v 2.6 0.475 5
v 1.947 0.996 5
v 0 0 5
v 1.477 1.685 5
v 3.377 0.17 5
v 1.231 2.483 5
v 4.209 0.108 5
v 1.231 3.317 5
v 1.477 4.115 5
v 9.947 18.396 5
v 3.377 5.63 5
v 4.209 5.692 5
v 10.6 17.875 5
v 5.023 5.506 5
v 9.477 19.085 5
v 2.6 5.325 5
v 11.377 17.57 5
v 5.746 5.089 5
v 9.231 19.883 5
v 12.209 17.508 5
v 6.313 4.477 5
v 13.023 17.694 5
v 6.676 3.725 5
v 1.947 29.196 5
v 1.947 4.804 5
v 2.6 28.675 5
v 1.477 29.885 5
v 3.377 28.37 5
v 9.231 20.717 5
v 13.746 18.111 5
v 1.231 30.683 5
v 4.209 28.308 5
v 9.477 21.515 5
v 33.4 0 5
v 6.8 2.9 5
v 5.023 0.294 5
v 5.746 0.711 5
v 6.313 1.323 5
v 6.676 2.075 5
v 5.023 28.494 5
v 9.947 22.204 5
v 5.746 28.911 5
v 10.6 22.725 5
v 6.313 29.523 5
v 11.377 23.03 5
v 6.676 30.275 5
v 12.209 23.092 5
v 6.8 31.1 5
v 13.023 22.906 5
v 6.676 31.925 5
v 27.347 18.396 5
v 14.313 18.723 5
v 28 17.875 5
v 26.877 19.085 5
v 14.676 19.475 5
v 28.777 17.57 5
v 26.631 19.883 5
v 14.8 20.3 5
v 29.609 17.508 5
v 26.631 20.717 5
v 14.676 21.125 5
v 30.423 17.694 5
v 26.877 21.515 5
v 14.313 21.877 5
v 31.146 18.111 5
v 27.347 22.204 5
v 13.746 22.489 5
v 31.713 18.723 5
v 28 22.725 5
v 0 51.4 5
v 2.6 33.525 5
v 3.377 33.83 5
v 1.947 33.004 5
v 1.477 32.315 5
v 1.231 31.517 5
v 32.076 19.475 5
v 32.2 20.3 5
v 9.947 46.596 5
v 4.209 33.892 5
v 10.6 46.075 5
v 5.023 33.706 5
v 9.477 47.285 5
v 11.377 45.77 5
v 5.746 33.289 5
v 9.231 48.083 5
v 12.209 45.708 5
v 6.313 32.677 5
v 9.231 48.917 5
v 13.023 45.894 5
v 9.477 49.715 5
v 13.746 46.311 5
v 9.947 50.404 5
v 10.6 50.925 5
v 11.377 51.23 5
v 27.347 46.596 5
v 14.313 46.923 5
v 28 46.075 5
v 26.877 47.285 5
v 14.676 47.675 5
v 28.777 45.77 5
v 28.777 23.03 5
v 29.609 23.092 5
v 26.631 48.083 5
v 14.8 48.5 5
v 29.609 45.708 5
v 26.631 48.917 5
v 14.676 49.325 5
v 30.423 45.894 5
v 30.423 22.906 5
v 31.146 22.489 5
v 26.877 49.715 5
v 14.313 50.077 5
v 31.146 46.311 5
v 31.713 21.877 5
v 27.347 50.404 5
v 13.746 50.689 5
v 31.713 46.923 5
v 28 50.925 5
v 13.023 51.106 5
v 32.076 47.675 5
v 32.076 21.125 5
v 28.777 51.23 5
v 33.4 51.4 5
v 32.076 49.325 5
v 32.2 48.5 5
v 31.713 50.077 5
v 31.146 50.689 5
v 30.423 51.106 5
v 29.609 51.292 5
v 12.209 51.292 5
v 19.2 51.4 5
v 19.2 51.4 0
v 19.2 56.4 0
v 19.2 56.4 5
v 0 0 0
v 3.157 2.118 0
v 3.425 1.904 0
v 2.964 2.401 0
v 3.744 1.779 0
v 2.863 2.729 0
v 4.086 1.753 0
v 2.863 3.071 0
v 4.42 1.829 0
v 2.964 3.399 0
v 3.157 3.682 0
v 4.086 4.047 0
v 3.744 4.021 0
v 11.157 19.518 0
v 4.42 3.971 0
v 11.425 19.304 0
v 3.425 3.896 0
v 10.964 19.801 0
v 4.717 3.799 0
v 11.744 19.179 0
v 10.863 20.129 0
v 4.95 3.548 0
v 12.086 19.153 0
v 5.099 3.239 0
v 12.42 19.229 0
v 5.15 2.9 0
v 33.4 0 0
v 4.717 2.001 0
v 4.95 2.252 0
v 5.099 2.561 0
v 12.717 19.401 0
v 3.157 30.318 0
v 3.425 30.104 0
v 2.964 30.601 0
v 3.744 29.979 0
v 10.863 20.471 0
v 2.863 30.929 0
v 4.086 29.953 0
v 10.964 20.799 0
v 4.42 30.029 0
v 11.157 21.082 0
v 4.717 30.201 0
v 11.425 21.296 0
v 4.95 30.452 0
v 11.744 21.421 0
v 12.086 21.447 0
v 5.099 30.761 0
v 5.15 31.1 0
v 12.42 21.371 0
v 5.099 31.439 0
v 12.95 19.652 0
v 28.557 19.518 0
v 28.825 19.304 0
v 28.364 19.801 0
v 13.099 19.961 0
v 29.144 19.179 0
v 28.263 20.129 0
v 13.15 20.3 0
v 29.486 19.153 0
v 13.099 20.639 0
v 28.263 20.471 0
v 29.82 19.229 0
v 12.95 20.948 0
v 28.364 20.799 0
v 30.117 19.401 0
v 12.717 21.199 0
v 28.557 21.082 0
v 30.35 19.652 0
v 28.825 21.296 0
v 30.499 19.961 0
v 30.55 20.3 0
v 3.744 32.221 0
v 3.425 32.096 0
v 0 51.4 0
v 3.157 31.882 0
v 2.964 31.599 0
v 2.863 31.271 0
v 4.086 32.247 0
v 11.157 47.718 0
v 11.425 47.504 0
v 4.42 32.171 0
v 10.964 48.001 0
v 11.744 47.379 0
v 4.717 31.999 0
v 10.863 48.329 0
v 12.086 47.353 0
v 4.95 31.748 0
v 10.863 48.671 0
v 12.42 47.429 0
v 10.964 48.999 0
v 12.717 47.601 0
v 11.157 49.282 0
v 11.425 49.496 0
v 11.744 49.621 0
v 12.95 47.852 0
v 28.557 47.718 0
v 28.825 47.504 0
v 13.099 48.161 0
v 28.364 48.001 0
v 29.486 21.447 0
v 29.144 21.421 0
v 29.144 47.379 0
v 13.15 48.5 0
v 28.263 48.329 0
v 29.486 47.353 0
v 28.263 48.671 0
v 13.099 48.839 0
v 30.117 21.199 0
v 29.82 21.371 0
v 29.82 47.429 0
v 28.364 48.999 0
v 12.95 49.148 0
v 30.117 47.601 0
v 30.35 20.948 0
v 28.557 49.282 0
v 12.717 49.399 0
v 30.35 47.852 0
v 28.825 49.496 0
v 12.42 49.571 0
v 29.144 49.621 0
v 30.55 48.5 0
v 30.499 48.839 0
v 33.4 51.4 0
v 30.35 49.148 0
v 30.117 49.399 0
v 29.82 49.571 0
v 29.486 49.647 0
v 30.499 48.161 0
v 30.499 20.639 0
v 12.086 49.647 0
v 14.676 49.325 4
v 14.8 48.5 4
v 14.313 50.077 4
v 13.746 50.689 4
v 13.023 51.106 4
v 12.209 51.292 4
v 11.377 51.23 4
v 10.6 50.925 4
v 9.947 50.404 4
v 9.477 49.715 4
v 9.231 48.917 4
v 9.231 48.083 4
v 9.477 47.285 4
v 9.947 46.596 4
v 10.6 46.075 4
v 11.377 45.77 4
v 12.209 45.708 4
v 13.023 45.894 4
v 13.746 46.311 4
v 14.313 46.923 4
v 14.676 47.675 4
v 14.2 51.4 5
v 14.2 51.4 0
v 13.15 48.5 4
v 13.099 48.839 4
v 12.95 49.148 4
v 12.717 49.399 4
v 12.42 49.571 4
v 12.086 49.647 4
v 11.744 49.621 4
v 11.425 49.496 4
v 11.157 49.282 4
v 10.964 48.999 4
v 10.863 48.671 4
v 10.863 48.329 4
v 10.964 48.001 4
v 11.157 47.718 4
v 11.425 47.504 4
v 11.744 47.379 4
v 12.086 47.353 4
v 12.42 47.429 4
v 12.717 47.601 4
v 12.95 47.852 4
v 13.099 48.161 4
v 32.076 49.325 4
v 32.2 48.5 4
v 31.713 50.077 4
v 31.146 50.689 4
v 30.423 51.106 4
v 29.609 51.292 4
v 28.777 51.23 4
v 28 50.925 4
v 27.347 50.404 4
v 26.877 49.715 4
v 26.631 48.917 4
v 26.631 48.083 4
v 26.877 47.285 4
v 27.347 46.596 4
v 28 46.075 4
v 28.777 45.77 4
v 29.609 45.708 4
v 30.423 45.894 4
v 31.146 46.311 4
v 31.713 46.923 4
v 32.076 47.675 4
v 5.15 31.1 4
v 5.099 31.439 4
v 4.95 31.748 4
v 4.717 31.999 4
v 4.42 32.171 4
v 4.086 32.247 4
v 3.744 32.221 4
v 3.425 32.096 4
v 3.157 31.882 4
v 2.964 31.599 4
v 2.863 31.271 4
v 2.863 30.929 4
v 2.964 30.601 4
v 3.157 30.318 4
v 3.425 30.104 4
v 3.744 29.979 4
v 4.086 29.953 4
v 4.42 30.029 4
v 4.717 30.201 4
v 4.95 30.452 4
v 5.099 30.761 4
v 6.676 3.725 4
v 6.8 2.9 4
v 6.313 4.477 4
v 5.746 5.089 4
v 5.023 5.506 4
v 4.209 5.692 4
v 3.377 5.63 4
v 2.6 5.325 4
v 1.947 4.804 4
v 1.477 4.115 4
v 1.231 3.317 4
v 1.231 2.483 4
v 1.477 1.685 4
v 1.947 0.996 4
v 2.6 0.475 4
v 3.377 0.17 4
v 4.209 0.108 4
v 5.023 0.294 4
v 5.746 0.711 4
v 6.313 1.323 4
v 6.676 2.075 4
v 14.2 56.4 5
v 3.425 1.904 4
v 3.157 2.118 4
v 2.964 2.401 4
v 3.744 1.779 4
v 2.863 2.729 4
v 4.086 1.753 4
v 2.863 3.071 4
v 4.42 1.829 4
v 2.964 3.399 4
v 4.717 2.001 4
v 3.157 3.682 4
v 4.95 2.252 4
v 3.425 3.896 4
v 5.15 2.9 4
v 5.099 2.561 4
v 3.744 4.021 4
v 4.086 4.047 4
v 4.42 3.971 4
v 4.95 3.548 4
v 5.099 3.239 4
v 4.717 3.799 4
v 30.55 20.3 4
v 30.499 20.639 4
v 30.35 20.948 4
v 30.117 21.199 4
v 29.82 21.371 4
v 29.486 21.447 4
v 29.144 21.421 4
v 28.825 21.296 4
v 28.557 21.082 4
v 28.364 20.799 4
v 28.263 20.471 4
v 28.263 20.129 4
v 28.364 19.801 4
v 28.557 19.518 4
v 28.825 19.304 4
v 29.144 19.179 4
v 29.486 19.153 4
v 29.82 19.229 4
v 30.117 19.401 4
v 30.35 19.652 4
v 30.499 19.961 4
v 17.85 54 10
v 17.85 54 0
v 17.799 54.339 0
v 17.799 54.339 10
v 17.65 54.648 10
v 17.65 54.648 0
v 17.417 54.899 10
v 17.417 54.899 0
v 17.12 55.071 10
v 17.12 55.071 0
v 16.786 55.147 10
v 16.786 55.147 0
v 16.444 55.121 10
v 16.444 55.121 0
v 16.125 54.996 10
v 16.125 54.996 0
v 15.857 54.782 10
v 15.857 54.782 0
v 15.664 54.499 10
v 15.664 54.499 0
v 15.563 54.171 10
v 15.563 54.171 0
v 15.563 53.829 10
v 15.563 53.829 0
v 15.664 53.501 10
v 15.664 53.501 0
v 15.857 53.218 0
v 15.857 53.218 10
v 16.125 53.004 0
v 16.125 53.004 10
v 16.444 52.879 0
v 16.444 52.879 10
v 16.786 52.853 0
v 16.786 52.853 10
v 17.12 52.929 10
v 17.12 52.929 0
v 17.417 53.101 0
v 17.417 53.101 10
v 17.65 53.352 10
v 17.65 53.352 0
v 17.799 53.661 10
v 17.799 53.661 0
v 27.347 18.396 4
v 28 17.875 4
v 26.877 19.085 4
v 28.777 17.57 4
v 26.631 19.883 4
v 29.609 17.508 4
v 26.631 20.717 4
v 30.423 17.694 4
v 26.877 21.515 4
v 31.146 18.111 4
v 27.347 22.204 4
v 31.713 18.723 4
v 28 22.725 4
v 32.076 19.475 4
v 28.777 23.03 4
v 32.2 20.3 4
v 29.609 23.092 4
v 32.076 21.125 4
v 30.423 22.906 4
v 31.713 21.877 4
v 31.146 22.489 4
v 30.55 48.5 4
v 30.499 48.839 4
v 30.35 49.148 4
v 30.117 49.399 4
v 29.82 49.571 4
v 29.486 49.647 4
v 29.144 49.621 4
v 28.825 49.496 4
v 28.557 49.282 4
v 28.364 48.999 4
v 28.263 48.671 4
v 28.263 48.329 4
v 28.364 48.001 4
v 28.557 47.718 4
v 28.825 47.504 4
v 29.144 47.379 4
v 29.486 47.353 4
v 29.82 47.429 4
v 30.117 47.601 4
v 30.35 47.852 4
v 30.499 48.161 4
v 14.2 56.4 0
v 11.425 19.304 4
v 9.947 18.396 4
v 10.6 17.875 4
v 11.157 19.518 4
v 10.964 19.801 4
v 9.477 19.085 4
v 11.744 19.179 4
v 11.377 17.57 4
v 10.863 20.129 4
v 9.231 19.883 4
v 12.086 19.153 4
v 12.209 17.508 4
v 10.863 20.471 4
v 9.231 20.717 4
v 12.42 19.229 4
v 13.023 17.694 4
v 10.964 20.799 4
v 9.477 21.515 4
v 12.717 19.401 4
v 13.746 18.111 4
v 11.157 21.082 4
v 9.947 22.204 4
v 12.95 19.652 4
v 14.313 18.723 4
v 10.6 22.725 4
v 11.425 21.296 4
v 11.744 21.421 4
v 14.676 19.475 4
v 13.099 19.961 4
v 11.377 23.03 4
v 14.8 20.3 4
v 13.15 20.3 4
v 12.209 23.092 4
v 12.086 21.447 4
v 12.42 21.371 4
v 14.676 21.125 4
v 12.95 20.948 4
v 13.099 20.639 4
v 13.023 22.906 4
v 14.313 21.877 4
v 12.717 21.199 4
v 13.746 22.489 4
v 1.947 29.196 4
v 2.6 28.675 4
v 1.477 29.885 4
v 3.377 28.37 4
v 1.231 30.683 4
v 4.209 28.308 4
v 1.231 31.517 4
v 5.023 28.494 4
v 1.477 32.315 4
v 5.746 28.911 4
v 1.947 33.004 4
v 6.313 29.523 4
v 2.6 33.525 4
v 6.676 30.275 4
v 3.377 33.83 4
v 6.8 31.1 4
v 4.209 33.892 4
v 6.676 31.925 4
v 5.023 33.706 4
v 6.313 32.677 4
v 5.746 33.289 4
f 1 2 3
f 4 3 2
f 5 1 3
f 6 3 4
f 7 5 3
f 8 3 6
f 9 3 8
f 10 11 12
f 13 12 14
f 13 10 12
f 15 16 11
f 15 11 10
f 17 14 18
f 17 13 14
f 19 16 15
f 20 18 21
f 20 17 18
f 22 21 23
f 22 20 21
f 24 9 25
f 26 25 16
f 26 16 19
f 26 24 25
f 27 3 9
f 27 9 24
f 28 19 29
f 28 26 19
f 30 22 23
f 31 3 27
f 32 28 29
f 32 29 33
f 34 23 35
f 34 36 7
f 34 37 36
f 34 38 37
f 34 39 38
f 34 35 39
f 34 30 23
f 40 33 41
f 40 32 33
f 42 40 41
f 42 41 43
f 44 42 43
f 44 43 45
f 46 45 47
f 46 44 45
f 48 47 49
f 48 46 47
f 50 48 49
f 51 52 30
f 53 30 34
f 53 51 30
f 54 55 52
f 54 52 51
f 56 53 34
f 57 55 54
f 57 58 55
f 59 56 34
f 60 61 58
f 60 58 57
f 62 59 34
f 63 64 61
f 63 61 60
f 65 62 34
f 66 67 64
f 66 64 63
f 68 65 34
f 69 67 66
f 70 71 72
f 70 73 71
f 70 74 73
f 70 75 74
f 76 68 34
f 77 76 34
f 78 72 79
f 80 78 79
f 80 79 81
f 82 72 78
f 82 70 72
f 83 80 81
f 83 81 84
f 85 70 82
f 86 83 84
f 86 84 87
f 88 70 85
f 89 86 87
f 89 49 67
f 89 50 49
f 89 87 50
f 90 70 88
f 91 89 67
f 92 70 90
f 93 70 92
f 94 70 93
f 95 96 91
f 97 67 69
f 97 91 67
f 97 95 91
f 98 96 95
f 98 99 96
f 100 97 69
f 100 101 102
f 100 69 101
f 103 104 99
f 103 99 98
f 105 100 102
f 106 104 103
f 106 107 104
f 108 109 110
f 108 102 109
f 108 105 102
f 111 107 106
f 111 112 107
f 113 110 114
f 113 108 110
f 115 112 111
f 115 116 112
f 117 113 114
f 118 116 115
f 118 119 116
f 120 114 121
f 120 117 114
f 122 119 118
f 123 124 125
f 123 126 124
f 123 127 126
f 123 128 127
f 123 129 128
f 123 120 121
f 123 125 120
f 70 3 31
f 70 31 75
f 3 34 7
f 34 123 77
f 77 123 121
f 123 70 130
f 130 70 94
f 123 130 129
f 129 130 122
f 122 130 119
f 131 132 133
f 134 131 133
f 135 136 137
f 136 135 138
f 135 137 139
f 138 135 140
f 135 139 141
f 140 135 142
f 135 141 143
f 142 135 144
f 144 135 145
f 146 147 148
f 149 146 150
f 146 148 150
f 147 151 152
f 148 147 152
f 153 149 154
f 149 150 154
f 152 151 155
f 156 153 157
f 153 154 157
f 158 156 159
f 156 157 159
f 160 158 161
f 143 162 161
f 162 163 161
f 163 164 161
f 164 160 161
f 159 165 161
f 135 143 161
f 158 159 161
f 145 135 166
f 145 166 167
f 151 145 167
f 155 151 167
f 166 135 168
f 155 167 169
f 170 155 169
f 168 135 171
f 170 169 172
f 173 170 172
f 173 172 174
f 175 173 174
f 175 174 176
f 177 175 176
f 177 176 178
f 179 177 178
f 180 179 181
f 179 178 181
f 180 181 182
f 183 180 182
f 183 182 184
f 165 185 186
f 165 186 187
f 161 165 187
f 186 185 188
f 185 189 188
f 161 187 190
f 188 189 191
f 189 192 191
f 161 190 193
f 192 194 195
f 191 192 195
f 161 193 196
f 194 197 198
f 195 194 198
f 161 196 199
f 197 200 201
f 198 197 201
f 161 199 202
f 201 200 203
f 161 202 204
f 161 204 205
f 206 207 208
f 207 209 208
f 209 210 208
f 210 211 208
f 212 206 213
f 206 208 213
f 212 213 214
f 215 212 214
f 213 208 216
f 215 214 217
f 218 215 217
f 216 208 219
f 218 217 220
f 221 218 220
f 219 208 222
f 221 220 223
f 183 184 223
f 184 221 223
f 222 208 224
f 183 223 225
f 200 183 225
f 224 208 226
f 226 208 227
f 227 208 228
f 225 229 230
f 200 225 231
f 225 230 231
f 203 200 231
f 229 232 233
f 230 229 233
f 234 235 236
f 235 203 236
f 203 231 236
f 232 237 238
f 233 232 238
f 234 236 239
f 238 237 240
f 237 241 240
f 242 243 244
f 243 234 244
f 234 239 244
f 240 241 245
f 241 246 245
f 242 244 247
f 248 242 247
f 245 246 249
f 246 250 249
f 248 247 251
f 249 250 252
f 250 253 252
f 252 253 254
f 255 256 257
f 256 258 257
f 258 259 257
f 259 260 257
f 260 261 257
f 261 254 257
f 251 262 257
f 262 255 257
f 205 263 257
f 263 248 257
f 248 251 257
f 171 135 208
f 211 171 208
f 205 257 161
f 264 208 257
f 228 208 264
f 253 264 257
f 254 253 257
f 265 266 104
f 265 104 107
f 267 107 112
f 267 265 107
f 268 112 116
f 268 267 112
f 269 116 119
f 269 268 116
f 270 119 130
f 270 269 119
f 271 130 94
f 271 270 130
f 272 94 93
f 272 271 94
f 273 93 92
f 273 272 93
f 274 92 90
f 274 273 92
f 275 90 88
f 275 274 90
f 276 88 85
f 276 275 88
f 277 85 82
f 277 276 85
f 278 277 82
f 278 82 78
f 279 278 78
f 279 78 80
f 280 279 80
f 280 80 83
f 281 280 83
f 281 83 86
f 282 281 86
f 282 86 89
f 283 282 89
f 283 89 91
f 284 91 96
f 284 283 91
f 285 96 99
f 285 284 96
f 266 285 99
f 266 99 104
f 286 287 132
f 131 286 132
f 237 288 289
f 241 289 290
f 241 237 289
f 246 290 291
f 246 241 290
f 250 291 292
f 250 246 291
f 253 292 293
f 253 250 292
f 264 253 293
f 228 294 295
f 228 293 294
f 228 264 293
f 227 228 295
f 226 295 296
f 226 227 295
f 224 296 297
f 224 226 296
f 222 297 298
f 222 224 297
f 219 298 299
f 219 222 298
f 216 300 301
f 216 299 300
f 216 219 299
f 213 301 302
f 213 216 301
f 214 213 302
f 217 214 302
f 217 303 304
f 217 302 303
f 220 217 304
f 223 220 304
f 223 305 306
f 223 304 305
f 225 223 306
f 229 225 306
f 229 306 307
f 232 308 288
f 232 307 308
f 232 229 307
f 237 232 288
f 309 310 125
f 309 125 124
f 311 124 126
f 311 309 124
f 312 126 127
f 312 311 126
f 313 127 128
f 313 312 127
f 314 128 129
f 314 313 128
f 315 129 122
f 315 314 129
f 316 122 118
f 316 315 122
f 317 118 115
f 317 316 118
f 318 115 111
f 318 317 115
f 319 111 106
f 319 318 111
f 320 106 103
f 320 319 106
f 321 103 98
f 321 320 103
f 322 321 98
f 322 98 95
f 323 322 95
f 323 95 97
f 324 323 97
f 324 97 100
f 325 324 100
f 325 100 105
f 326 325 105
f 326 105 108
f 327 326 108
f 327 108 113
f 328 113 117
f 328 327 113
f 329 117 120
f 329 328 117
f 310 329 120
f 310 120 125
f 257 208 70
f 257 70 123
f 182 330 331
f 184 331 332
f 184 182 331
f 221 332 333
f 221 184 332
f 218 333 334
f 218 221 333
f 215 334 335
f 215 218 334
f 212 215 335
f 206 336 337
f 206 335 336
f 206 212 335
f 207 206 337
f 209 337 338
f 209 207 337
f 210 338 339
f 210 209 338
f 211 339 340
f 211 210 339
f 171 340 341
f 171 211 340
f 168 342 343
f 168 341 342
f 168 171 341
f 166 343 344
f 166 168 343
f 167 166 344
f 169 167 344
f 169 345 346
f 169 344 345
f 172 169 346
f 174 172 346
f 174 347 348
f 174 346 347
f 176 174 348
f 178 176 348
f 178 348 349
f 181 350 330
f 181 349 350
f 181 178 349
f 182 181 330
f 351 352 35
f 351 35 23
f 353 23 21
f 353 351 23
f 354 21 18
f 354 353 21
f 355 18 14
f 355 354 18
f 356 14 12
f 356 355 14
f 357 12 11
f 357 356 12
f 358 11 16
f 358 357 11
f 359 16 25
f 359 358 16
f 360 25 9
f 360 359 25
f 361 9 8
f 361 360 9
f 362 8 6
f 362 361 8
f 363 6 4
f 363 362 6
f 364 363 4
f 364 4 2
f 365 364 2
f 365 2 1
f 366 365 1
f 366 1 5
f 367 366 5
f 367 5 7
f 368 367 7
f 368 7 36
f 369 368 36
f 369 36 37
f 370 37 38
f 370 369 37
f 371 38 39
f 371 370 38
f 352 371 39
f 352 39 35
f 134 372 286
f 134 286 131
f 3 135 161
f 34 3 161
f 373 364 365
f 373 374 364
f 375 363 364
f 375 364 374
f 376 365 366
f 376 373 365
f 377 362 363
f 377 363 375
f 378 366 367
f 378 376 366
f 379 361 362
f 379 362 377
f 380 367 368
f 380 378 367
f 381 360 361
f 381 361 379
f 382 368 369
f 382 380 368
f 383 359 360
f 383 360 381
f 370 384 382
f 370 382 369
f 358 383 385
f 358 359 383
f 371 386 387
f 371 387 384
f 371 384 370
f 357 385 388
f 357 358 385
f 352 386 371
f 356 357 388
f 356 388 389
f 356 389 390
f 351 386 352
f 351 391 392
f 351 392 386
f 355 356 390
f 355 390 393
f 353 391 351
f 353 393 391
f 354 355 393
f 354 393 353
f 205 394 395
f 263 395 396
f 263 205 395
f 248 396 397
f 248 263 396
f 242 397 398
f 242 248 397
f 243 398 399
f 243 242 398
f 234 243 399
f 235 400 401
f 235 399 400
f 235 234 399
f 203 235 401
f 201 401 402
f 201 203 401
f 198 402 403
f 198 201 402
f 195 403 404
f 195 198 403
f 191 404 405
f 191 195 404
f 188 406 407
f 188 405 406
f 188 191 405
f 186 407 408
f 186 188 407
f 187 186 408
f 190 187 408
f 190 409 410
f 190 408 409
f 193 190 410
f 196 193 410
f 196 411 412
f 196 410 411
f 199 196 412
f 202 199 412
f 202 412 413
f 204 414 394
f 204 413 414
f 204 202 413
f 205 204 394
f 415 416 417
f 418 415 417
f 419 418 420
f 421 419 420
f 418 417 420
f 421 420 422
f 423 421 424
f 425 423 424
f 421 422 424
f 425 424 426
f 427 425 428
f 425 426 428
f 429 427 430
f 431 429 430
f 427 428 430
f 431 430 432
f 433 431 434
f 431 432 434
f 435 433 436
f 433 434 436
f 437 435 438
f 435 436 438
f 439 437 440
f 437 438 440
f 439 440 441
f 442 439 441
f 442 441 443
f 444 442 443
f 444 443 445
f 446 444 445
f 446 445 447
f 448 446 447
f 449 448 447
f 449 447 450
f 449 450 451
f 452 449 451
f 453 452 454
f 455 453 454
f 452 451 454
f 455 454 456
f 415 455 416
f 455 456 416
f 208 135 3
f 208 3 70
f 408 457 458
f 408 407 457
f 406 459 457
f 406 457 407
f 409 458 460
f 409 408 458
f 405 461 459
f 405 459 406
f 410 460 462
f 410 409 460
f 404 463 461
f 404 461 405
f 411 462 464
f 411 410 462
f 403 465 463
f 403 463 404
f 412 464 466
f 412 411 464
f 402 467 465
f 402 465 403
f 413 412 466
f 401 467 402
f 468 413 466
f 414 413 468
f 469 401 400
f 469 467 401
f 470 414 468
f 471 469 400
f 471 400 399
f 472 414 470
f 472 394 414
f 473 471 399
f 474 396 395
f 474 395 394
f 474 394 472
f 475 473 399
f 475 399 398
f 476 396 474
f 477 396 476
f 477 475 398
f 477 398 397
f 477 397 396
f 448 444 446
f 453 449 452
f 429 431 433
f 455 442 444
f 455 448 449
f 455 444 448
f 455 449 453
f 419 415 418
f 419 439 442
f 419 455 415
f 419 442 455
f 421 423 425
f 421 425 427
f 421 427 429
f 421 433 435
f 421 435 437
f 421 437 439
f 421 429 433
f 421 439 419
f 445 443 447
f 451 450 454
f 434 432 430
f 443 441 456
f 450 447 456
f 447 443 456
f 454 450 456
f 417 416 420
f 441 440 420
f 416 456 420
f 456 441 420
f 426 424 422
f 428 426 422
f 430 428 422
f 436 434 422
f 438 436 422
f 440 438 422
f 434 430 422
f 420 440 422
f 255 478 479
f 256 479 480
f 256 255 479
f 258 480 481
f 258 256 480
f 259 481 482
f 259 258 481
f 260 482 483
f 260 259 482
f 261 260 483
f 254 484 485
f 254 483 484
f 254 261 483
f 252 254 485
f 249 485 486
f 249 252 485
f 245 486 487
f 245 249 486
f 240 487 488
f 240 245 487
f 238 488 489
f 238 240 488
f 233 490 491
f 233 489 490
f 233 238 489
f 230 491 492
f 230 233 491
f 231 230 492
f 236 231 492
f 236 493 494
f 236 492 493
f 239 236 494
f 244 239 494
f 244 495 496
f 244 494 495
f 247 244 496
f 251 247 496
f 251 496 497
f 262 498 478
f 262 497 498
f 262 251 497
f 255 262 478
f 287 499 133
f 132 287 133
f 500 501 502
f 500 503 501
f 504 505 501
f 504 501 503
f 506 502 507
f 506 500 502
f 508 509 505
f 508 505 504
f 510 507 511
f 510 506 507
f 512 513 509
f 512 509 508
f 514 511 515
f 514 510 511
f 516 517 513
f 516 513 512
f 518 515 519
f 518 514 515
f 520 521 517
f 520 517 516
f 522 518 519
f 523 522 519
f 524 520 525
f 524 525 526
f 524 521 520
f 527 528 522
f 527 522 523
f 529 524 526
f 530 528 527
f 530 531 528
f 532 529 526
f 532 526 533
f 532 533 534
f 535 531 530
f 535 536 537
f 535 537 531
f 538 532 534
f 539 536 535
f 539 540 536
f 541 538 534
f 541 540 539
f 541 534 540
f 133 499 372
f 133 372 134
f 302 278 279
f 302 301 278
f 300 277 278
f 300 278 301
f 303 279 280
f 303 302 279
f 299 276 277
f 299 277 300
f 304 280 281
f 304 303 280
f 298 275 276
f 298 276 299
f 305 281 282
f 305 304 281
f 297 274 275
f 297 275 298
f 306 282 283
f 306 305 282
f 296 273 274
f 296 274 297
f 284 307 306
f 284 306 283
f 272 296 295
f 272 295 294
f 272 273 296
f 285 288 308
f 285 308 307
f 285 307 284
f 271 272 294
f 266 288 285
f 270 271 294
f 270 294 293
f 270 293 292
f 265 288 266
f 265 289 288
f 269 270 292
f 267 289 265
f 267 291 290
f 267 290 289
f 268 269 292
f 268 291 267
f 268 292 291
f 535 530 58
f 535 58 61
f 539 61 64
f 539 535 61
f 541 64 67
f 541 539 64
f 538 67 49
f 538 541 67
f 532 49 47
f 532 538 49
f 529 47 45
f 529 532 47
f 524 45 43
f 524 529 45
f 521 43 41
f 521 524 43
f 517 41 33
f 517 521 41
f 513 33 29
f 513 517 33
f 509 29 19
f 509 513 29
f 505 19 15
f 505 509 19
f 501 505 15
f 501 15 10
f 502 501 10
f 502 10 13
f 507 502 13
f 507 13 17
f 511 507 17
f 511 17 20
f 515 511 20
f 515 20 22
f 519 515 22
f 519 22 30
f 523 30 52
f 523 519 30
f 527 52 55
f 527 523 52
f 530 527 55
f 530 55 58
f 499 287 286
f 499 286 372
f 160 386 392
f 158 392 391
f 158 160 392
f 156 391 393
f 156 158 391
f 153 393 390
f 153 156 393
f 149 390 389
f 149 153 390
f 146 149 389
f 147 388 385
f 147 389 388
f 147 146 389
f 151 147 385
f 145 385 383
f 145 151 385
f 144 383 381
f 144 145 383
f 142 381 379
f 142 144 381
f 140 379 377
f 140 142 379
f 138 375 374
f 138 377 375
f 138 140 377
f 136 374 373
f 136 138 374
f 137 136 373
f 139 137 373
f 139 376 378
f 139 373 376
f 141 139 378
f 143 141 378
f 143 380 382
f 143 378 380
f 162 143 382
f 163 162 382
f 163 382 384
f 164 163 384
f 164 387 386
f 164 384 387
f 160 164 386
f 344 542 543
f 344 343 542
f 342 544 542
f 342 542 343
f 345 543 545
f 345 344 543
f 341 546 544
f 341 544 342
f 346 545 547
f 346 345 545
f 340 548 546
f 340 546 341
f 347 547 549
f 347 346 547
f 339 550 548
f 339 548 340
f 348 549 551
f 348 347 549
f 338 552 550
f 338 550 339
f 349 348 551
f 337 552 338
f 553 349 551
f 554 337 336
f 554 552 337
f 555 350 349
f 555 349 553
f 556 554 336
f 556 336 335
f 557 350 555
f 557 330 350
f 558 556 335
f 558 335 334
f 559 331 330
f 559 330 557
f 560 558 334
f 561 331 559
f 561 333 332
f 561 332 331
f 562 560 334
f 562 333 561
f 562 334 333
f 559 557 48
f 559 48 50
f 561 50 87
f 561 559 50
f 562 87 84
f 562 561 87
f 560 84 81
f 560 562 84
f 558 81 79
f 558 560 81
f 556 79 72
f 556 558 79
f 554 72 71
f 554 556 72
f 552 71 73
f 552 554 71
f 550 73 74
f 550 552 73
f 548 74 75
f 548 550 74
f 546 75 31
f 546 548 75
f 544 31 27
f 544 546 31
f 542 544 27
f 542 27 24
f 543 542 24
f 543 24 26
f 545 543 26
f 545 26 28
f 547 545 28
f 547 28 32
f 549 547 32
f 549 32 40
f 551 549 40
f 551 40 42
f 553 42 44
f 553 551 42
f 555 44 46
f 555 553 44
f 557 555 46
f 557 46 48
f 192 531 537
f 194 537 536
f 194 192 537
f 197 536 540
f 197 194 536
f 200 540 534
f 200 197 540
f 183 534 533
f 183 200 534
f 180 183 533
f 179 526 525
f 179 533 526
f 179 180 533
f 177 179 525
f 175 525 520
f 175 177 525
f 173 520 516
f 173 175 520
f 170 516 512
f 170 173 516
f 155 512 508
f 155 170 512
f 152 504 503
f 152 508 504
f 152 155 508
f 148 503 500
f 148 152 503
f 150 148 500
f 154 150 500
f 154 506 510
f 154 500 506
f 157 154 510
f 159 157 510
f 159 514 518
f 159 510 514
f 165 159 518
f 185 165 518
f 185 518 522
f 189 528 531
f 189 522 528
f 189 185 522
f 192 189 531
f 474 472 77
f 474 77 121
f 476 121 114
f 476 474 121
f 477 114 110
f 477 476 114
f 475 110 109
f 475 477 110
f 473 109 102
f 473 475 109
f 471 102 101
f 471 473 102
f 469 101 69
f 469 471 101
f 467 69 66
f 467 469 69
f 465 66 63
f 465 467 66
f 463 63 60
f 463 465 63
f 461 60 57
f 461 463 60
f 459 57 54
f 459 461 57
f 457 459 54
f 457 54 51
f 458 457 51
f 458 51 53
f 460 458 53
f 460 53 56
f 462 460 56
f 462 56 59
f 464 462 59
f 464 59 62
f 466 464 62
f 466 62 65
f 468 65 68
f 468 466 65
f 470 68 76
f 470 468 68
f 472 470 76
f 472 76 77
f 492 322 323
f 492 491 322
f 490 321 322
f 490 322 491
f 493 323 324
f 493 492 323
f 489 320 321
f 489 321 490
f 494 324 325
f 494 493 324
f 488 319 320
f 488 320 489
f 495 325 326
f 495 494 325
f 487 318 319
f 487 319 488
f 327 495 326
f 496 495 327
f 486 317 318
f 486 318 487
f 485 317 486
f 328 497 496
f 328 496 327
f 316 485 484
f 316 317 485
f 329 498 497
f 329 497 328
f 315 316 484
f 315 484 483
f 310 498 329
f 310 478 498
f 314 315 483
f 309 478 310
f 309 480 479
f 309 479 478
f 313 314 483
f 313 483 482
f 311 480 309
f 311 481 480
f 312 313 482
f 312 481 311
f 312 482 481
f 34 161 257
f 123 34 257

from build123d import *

# Parameters (mm, degrees)
CYLINDER001_R                 = 1.15
CYLINDER001_DEPTH             = 10
CYLINDER002_R                 = 2.8
CYLINDER002_DEPTH             = 1
CYLINDER001001_R              = 1.15
CYLINDER001001_DEPTH          = 10
CYLINDER002001_R              = 2.8
CYLINDER002001_DEPTH          = 1
CYLINDER001001001_R           = 1.15
CYLINDER001001001_DEPTH       = 10
CYLINDER002001001_R           = 2.8
CYLINDER002001001_DEPTH       = 1
CYLINDER001001001001_R        = 1.15
CYLINDER001001001001_DEPTH    = 10
CYLINDER002001001001_R        = 2.8
CYLINDER002001001001_DEPTH    = 1
CYLINDER001001001001001_R     = 1.15
CYLINDER001001001001001_DEPTH = 10
CYLINDER002001001002_R        = 2.8
CYLINDER002001001002_DEPTH    = 1
CYLINDER001001001001002_R     = 1.15
CYLINDER001001001001002_DEPTH = 10
CYLINDER_R                    = 2.8
CYLINDER_DEPTH                = 1
BOX_W                         = 33.400002
BOX_H                         = 51.400002
BOX_DEPTH                     = 5
BOX001_W                      = 5
BOX001_H                      = 5
BOX001_DEPTH                  = 5
CYLINDER001001001001003_R     = 1.15
CYLINDER001001001001003_DEPTH = 10


with BuildPart() as cylinder001:
    # Cylinder001 → Cylinder001 (new body)
    with BuildSketch(Plane(origin=(4, 2.9, 0), x_dir=(1, 0, 0), z_dir=(0, 0, 1))):
        Circle(CYLINDER001_R)
    extrude(amount=CYLINDER001_DEPTH)


with BuildPart() as cylinder002:
    # Cylinder002 → Cylinder002 (new body)
    with BuildSketch(Plane(origin=(4, 31.1, 4), x_dir=(1, 0, 0), z_dir=(0, 0, 1))):
        Circle(CYLINDER002_R)
    extrude(amount=CYLINDER002_DEPTH)


with BuildPart() as cylinder001001:
    # Cylinder001001 → Cylinder001001 (new body)
    with BuildSketch(Plane(origin=(4, 31.1, 0), x_dir=(1, 0, 0), z_dir=(0, 0, 1))):
        Circle(CYLINDER001001_R)
    extrude(amount=CYLINDER001001_DEPTH)


with BuildPart() as cylinder002001:
    # Cylinder002001 → Cylinder002001 (new body)
    with BuildSketch(Plane(origin=(12, 20.3, 4), x_dir=(1, 0, 0), z_dir=(0, 0, 1))):
        Circle(CYLINDER002001_R)
    extrude(amount=CYLINDER002001_DEPTH)


with BuildPart() as cylinder001001001:
    # Cylinder001001001 → Cylinder001001001 (new body)
    with BuildSketch(Plane(origin=(12, 20.3, 0), x_dir=(1, 0, 0), z_dir=(0, 0, 1))):
        Circle(CYLINDER001001001_R)
    extrude(amount=CYLINDER001001001_DEPTH)


with BuildPart() as cylinder002001001:
    # Cylinder002001001 → Cylinder002001001 (new body)
    with BuildSketch(Plane(origin=(12, 48.5, 4), x_dir=(1, 0, 0), z_dir=(0, 0, 1))):
        Circle(CYLINDER002001001_R)
    extrude(amount=CYLINDER002001001_DEPTH)


with BuildPart() as cylinder001001001001:
    # Cylinder001001001001 → Cylinder001001001001 (new body)
    with BuildSketch(Plane(origin=(12, 48.5, 0), x_dir=(1, 0, 0), z_dir=(0, 0, 1))):
        Circle(CYLINDER001001001001_R)
    extrude(amount=CYLINDER001001001001_DEPTH)


with BuildPart() as cylinder002001001001:
    # Cylinder002001001001 → Cylinder002001001001 (new body)
    with BuildSketch(Plane(origin=(29.4, 48.5, 4), x_dir=(1, 0, 0), z_dir=(0, 0, 1))):
        Circle(CYLINDER002001001001_R)
    extrude(amount=CYLINDER002001001001_DEPTH)


with BuildPart() as cylinder001001001001001:
    # Cylinder001001001001001 → Cylinder001001001001001 (new body)
    with BuildSketch(Plane(origin=(29.4, 48.5, 0), x_dir=(1, 0, 0), z_dir=(0, 0, 1))):
        Circle(CYLINDER001001001001001_R)
    extrude(amount=CYLINDER001001001001001_DEPTH)


with BuildPart() as cylinder002001001002:
    # Cylinder002001001002 → Cylinder002001001002 (new body)
    with BuildSketch(Plane(origin=(29.4, 20.3, 4), x_dir=(1, 0, 0), z_dir=(0, 0, 1))):
        Circle(CYLINDER002001001002_R)
    extrude(amount=CYLINDER002001001002_DEPTH)


with BuildPart() as cylinder001001001001002:
    # Cylinder001001001001002 → Cylinder001001001001002 (new body)
    with BuildSketch(Plane(origin=(29.4, 20.3, 0), x_dir=(1, 0, 0), z_dir=(0, 0, 1))):
        Circle(CYLINDER001001001001002_R)
    extrude(amount=CYLINDER001001001001002_DEPTH)


with BuildPart() as cylinder:
    # Cylinder → Cylinder (new body)
    with BuildSketch(Plane(origin=(4, 2.9, 4), x_dir=(1, 0, 0), z_dir=(0, 0, 1))):
        Circle(CYLINDER_R)
    extrude(amount=CYLINDER_DEPTH)


with BuildPart() as cut011:
    # Box → Box (new body)
    with BuildSketch(Plane.XY):
        with Locations((16.700001, 25.700001)):
            Rectangle(BOX_W, BOX_H)
    extrude(amount=BOX_DEPTH)

    # Cut: cut Cylinder
    add(cylinder.part, mode=Mode.SUBTRACT)

    # Cut001: cut Cylinder001001001001002
    add(cylinder001001001001002.part, mode=Mode.SUBTRACT)

    # Cut002: cut Cylinder002001001002
    add(cylinder002001001002.part, mode=Mode.SUBTRACT)

    # Cut003: cut Cylinder001001001001001
    add(cylinder001001001001001.part, mode=Mode.SUBTRACT)

    # Cut004: cut Cylinder002001001001
    add(cylinder002001001001.part, mode=Mode.SUBTRACT)

    # Cut005: cut Cylinder001001001001
    add(cylinder001001001001.part, mode=Mode.SUBTRACT)

    # Cut006: cut Cylinder002001001
    add(cylinder002001001.part, mode=Mode.SUBTRACT)

    # Cut007: cut Cylinder001001001
    add(cylinder001001001.part, mode=Mode.SUBTRACT)

    # Cut008: cut Cylinder002001
    add(cylinder002001.part, mode=Mode.SUBTRACT)

    # Cut009: cut Cylinder001001
    add(cylinder001001.part, mode=Mode.SUBTRACT)

    # Cut010: cut Cylinder002
    add(cylinder002.part, mode=Mode.SUBTRACT)

    # Cut011: cut Cylinder001
    add(cylinder001.part, mode=Mode.SUBTRACT)


with BuildPart() as box001:
    # Box001 → Box001 (new body)
    with BuildSketch(Plane(origin=(14.2, 51.4, 0), x_dir=(1, 0, 0), z_dir=(0, 0, 1))):
        with Locations((2.5, 2.5)):
            Rectangle(BOX001_W, BOX001_H)
    extrude(amount=BOX001_DEPTH)


with BuildPart() as cylinder001001001001003:
    # Cylinder001001001001003 → Cylinder001001001001003 (new body)
    with BuildSketch(Plane(origin=(16.7, 54, 0), x_dir=(1, 0, 0), z_dir=(0, 0, 1))):
        Circle(CYLINDER001001001001003_R)
    extrude(amount=CYLINDER001001001001003_DEPTH)


solid = Compound([cut011.part, box001.part, cylinder001001001001003.part])
